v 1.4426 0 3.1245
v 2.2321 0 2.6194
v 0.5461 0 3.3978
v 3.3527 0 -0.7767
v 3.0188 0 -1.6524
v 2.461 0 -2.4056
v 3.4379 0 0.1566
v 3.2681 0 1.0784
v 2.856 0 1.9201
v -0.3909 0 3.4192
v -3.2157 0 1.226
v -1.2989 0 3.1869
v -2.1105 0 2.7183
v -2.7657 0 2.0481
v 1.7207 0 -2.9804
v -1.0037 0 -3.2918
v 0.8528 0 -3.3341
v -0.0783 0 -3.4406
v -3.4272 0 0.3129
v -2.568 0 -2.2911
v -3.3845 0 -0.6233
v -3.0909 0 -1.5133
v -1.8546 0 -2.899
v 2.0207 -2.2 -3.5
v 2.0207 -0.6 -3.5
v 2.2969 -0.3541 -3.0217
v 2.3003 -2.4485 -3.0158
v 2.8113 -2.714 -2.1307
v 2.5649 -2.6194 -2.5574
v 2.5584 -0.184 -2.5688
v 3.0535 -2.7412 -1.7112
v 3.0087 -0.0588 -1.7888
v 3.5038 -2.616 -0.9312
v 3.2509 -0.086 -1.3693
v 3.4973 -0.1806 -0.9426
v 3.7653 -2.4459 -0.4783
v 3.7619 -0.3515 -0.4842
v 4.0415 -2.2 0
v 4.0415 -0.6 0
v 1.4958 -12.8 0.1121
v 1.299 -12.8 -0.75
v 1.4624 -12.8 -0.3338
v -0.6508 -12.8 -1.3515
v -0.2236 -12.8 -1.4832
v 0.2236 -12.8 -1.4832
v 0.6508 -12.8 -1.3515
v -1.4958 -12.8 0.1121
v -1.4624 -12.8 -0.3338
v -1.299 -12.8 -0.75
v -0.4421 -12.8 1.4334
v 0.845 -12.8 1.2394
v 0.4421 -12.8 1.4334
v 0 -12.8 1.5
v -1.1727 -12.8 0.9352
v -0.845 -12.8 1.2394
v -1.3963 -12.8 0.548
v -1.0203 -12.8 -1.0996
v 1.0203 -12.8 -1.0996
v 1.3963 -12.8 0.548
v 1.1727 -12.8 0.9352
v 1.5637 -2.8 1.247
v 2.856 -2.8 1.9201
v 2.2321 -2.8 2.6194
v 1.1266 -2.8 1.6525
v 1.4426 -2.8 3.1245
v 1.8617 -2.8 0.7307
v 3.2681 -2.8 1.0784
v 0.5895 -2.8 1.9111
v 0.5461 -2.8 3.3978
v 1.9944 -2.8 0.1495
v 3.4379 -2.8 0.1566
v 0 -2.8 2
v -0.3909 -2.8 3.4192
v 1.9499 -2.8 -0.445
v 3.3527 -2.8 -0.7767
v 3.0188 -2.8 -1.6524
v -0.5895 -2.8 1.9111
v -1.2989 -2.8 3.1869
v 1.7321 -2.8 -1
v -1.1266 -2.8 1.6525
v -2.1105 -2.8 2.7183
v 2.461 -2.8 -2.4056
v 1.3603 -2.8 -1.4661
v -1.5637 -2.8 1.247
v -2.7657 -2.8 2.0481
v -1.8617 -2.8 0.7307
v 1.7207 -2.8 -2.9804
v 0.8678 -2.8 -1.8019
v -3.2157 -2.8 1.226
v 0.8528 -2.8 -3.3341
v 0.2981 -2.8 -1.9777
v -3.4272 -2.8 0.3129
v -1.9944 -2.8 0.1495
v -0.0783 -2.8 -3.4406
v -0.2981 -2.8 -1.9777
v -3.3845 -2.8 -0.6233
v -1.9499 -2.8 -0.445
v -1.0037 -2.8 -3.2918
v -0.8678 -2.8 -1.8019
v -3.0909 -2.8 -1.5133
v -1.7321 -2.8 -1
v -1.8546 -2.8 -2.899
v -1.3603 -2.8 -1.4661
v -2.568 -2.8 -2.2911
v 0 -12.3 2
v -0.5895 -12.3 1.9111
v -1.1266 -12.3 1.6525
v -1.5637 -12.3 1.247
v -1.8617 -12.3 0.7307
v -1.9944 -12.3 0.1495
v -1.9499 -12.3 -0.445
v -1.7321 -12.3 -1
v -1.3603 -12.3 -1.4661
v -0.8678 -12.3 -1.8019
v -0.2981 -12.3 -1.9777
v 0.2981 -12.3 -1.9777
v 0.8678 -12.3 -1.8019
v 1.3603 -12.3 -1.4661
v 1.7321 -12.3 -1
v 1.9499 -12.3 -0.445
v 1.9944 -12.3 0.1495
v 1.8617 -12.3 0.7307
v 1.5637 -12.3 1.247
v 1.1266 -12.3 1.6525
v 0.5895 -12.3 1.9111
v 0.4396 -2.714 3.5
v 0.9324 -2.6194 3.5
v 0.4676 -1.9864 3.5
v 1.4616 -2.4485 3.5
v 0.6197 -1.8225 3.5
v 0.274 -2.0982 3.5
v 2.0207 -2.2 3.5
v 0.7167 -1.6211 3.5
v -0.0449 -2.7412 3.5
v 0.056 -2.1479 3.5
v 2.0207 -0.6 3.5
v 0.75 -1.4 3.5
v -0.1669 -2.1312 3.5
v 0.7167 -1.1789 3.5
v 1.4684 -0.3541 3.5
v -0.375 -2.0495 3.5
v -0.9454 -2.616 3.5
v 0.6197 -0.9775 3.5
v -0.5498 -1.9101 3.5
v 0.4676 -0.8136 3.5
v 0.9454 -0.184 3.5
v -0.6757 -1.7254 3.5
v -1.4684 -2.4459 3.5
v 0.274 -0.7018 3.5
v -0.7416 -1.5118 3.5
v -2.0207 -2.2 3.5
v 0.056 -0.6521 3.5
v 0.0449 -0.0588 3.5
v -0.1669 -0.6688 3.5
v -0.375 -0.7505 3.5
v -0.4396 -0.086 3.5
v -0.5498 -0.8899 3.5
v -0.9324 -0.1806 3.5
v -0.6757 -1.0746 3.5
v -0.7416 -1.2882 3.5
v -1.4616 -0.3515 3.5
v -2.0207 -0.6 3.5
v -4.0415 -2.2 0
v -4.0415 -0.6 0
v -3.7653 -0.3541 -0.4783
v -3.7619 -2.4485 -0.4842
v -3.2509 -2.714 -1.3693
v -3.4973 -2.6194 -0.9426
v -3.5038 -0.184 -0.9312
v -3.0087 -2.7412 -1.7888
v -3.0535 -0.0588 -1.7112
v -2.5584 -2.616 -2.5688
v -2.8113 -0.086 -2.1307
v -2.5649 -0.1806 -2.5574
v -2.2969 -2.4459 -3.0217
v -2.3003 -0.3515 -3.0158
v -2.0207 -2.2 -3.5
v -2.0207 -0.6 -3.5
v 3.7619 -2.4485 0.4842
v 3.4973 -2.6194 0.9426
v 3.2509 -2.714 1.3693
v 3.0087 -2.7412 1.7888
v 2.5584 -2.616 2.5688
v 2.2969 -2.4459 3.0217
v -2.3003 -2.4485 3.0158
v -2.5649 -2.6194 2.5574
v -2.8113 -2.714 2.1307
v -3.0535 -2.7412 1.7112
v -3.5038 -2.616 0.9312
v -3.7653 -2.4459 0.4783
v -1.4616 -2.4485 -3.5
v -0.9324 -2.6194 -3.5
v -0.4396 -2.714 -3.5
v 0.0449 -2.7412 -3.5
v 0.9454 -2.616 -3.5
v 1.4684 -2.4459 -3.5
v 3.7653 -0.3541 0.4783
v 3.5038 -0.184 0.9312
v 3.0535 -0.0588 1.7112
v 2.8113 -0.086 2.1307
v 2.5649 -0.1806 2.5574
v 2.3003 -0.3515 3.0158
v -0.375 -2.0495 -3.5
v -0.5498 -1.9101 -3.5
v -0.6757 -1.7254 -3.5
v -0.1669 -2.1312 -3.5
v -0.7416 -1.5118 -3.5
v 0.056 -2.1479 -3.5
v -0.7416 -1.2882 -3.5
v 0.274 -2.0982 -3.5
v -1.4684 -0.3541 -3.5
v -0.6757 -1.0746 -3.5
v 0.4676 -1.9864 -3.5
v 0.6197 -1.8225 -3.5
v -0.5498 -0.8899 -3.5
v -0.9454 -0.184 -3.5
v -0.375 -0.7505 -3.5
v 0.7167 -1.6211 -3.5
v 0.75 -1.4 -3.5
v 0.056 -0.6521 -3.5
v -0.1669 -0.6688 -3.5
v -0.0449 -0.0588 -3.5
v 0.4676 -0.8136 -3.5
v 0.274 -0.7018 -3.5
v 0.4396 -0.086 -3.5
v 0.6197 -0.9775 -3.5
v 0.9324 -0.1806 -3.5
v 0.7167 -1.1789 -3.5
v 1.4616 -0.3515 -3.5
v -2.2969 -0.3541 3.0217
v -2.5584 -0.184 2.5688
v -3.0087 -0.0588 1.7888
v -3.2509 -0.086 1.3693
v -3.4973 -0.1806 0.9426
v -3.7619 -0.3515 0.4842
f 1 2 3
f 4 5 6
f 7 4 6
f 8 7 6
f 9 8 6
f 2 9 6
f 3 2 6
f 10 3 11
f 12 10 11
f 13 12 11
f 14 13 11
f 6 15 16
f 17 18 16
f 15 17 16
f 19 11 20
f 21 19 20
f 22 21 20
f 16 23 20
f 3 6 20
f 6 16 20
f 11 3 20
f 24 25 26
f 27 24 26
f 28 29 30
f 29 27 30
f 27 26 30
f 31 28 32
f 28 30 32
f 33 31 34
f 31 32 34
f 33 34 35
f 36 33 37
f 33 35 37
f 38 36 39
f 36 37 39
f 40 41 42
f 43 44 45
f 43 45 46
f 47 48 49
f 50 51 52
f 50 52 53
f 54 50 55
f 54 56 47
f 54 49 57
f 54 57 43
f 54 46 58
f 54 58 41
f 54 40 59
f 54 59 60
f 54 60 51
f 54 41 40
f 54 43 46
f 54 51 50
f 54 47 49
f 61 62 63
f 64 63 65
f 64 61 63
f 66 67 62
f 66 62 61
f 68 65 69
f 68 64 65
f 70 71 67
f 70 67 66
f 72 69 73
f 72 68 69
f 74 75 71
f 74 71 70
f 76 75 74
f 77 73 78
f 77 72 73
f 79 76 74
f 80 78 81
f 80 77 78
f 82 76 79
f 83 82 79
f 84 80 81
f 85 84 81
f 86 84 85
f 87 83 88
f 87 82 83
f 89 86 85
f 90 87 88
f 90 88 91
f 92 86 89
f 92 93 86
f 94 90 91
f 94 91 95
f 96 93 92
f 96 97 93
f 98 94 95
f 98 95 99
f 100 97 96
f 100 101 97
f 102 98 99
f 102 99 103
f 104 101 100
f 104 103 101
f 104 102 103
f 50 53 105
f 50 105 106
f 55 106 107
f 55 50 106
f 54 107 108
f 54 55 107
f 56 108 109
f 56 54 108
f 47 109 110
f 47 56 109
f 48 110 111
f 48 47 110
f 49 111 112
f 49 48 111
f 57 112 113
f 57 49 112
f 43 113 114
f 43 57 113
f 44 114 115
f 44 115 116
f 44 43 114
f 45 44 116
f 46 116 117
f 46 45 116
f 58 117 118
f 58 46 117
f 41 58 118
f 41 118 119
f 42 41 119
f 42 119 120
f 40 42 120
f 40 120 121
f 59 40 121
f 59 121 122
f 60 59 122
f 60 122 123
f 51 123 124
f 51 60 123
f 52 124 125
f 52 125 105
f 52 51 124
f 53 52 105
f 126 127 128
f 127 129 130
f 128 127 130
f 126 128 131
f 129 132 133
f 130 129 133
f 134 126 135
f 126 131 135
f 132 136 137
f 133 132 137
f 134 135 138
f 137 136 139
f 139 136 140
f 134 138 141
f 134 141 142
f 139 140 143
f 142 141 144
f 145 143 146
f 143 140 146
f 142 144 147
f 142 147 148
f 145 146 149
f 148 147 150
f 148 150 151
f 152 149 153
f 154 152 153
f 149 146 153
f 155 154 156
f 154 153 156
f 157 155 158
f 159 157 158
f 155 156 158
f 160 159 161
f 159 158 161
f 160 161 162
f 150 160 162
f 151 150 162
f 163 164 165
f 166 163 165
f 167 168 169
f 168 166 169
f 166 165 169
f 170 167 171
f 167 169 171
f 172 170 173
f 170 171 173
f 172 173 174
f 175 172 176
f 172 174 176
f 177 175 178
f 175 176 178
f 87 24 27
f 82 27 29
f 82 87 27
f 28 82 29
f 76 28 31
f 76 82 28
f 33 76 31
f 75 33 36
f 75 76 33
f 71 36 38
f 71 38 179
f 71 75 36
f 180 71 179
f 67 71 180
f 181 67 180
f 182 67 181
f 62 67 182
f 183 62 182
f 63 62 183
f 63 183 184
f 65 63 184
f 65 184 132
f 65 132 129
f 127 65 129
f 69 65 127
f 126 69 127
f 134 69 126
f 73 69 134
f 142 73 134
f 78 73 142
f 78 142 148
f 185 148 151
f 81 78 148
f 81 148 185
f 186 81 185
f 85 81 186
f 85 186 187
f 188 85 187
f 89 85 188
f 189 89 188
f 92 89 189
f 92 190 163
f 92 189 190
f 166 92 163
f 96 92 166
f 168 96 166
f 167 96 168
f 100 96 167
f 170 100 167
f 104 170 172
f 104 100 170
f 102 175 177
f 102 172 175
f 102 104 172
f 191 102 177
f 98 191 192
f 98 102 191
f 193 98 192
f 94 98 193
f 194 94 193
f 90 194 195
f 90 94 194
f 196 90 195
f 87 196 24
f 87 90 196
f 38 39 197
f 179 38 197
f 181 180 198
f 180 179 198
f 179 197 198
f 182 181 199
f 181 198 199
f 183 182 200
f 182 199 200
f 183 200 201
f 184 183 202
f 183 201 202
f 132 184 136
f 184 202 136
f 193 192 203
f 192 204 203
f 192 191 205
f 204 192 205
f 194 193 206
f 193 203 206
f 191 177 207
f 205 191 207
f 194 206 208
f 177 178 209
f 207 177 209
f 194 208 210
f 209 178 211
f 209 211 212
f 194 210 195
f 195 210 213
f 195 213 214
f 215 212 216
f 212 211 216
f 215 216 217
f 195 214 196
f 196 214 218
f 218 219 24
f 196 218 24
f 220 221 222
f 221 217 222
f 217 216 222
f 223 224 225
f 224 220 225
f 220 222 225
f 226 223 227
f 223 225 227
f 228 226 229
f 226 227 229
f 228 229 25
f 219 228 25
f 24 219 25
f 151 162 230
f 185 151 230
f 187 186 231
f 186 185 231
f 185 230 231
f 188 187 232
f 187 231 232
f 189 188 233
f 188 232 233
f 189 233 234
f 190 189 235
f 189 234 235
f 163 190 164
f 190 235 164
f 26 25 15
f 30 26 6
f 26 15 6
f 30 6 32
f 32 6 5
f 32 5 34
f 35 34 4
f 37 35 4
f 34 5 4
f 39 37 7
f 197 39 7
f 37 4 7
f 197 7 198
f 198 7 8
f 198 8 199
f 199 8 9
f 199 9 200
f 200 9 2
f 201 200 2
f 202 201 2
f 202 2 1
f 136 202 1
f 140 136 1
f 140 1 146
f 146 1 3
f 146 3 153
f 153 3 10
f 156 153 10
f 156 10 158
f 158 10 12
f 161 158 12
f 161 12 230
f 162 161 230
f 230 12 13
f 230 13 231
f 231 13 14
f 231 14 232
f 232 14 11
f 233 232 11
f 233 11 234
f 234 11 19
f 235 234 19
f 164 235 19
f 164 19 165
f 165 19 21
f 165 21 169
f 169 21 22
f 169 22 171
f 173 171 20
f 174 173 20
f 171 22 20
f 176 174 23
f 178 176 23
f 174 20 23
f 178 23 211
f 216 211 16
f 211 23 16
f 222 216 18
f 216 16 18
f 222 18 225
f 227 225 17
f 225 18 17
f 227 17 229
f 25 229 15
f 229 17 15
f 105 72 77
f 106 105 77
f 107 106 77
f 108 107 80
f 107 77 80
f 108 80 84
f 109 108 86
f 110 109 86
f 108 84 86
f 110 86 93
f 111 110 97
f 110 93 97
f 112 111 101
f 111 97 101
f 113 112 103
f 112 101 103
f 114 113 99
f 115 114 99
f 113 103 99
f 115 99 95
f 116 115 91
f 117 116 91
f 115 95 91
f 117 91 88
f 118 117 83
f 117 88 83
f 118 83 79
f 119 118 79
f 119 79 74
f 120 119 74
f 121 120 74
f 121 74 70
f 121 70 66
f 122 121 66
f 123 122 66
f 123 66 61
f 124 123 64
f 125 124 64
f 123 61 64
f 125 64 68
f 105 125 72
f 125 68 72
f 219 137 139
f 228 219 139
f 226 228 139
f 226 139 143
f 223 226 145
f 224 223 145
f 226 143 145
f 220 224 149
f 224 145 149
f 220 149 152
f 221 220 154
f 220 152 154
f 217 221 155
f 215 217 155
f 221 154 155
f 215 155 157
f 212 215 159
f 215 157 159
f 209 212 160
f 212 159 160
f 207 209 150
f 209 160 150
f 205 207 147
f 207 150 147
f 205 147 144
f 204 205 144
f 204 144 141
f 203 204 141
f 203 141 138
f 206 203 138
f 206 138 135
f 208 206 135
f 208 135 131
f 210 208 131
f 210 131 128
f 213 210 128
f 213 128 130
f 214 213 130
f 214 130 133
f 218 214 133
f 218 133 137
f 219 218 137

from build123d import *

# Parameters (mm, degrees)
EXTRUDE_1_DEPTH     = 2.8
SKETCH_5_R          = 2
EXTRUDE_2_DEPTH     = 10
CHAMFER_1_SIZE      = 0.5
SKETCH_6_R          = 0.75
CUT_EXTRUDE_1_DEPTH = 16.138471962


with BuildPart() as part:
    # Эскиз1 → Вытянуть1 (new body)
    with BuildSketch(Plane(origin=(0, 0, 0), x_dir=(1, 0, 0), z_dir=(0, 1, 0))):
        Polygon((-2.020725942, 3.5), (2.020725942, 3.5), (4.041451884, 0), (2.020725942, -3.5), (-2.020725942, -3.5), (-4.041451884, 0), align=None)
    extrude(amount=-EXTRUDE_1_DEPTH)

    # Эскиз5 → Вытянуть2 (add)
    with BuildSketch(Plane.XZ.offset(2.8)):
        with Locations(Location((0, 0, 0), (0, 0, 90))):
            Circle(SKETCH_5_R)
    extrude(amount=EXTRUDE_2_DEPTH)

    # Фаска1
    chamfer_1_edges = [part.edges().sort_by_distance(p)[0] for p in [
        (0, -12.8, -2),
    ]]
    chamfer(chamfer_1_edges, length=CHAMFER_1_SIZE)

    # Эскиз4 → Вырез-Повернуть1 (revolve, cut)
    with BuildSketch(Plane.XY, mode=Mode.PRIVATE) as cut_revolve_1_sk:
        Polygon((-4.041451884, -0.6), (-3.441451884, 0), (-4.041451884, 0), align=None)
        Polygon((-4.041451884, -2.2), (-3.441451884, -2.8), (-4.041451884, -2.8), align=None)
    revolve(cut_revolve_1_sk.sketch.rotate(Axis((0, -2.8, 0), (0, -1, 0)), 120.000000136), axis=Axis((0, -2.8, 0), (0, -1, 0)), mode=Mode.SUBTRACT)

    # Эскиз6 → Вырез-Вытянуть1 (cut, through all)
    with BuildSketch(Plane.XY.offset(3.5)):
        with Locations((0, -1.4)):
            Circle(SKETCH_6_R)
    extrude(amount=-CUT_EXTRUDE_1_DEPTH, mode=Mode.SUBTRACT)


solid = part.part
